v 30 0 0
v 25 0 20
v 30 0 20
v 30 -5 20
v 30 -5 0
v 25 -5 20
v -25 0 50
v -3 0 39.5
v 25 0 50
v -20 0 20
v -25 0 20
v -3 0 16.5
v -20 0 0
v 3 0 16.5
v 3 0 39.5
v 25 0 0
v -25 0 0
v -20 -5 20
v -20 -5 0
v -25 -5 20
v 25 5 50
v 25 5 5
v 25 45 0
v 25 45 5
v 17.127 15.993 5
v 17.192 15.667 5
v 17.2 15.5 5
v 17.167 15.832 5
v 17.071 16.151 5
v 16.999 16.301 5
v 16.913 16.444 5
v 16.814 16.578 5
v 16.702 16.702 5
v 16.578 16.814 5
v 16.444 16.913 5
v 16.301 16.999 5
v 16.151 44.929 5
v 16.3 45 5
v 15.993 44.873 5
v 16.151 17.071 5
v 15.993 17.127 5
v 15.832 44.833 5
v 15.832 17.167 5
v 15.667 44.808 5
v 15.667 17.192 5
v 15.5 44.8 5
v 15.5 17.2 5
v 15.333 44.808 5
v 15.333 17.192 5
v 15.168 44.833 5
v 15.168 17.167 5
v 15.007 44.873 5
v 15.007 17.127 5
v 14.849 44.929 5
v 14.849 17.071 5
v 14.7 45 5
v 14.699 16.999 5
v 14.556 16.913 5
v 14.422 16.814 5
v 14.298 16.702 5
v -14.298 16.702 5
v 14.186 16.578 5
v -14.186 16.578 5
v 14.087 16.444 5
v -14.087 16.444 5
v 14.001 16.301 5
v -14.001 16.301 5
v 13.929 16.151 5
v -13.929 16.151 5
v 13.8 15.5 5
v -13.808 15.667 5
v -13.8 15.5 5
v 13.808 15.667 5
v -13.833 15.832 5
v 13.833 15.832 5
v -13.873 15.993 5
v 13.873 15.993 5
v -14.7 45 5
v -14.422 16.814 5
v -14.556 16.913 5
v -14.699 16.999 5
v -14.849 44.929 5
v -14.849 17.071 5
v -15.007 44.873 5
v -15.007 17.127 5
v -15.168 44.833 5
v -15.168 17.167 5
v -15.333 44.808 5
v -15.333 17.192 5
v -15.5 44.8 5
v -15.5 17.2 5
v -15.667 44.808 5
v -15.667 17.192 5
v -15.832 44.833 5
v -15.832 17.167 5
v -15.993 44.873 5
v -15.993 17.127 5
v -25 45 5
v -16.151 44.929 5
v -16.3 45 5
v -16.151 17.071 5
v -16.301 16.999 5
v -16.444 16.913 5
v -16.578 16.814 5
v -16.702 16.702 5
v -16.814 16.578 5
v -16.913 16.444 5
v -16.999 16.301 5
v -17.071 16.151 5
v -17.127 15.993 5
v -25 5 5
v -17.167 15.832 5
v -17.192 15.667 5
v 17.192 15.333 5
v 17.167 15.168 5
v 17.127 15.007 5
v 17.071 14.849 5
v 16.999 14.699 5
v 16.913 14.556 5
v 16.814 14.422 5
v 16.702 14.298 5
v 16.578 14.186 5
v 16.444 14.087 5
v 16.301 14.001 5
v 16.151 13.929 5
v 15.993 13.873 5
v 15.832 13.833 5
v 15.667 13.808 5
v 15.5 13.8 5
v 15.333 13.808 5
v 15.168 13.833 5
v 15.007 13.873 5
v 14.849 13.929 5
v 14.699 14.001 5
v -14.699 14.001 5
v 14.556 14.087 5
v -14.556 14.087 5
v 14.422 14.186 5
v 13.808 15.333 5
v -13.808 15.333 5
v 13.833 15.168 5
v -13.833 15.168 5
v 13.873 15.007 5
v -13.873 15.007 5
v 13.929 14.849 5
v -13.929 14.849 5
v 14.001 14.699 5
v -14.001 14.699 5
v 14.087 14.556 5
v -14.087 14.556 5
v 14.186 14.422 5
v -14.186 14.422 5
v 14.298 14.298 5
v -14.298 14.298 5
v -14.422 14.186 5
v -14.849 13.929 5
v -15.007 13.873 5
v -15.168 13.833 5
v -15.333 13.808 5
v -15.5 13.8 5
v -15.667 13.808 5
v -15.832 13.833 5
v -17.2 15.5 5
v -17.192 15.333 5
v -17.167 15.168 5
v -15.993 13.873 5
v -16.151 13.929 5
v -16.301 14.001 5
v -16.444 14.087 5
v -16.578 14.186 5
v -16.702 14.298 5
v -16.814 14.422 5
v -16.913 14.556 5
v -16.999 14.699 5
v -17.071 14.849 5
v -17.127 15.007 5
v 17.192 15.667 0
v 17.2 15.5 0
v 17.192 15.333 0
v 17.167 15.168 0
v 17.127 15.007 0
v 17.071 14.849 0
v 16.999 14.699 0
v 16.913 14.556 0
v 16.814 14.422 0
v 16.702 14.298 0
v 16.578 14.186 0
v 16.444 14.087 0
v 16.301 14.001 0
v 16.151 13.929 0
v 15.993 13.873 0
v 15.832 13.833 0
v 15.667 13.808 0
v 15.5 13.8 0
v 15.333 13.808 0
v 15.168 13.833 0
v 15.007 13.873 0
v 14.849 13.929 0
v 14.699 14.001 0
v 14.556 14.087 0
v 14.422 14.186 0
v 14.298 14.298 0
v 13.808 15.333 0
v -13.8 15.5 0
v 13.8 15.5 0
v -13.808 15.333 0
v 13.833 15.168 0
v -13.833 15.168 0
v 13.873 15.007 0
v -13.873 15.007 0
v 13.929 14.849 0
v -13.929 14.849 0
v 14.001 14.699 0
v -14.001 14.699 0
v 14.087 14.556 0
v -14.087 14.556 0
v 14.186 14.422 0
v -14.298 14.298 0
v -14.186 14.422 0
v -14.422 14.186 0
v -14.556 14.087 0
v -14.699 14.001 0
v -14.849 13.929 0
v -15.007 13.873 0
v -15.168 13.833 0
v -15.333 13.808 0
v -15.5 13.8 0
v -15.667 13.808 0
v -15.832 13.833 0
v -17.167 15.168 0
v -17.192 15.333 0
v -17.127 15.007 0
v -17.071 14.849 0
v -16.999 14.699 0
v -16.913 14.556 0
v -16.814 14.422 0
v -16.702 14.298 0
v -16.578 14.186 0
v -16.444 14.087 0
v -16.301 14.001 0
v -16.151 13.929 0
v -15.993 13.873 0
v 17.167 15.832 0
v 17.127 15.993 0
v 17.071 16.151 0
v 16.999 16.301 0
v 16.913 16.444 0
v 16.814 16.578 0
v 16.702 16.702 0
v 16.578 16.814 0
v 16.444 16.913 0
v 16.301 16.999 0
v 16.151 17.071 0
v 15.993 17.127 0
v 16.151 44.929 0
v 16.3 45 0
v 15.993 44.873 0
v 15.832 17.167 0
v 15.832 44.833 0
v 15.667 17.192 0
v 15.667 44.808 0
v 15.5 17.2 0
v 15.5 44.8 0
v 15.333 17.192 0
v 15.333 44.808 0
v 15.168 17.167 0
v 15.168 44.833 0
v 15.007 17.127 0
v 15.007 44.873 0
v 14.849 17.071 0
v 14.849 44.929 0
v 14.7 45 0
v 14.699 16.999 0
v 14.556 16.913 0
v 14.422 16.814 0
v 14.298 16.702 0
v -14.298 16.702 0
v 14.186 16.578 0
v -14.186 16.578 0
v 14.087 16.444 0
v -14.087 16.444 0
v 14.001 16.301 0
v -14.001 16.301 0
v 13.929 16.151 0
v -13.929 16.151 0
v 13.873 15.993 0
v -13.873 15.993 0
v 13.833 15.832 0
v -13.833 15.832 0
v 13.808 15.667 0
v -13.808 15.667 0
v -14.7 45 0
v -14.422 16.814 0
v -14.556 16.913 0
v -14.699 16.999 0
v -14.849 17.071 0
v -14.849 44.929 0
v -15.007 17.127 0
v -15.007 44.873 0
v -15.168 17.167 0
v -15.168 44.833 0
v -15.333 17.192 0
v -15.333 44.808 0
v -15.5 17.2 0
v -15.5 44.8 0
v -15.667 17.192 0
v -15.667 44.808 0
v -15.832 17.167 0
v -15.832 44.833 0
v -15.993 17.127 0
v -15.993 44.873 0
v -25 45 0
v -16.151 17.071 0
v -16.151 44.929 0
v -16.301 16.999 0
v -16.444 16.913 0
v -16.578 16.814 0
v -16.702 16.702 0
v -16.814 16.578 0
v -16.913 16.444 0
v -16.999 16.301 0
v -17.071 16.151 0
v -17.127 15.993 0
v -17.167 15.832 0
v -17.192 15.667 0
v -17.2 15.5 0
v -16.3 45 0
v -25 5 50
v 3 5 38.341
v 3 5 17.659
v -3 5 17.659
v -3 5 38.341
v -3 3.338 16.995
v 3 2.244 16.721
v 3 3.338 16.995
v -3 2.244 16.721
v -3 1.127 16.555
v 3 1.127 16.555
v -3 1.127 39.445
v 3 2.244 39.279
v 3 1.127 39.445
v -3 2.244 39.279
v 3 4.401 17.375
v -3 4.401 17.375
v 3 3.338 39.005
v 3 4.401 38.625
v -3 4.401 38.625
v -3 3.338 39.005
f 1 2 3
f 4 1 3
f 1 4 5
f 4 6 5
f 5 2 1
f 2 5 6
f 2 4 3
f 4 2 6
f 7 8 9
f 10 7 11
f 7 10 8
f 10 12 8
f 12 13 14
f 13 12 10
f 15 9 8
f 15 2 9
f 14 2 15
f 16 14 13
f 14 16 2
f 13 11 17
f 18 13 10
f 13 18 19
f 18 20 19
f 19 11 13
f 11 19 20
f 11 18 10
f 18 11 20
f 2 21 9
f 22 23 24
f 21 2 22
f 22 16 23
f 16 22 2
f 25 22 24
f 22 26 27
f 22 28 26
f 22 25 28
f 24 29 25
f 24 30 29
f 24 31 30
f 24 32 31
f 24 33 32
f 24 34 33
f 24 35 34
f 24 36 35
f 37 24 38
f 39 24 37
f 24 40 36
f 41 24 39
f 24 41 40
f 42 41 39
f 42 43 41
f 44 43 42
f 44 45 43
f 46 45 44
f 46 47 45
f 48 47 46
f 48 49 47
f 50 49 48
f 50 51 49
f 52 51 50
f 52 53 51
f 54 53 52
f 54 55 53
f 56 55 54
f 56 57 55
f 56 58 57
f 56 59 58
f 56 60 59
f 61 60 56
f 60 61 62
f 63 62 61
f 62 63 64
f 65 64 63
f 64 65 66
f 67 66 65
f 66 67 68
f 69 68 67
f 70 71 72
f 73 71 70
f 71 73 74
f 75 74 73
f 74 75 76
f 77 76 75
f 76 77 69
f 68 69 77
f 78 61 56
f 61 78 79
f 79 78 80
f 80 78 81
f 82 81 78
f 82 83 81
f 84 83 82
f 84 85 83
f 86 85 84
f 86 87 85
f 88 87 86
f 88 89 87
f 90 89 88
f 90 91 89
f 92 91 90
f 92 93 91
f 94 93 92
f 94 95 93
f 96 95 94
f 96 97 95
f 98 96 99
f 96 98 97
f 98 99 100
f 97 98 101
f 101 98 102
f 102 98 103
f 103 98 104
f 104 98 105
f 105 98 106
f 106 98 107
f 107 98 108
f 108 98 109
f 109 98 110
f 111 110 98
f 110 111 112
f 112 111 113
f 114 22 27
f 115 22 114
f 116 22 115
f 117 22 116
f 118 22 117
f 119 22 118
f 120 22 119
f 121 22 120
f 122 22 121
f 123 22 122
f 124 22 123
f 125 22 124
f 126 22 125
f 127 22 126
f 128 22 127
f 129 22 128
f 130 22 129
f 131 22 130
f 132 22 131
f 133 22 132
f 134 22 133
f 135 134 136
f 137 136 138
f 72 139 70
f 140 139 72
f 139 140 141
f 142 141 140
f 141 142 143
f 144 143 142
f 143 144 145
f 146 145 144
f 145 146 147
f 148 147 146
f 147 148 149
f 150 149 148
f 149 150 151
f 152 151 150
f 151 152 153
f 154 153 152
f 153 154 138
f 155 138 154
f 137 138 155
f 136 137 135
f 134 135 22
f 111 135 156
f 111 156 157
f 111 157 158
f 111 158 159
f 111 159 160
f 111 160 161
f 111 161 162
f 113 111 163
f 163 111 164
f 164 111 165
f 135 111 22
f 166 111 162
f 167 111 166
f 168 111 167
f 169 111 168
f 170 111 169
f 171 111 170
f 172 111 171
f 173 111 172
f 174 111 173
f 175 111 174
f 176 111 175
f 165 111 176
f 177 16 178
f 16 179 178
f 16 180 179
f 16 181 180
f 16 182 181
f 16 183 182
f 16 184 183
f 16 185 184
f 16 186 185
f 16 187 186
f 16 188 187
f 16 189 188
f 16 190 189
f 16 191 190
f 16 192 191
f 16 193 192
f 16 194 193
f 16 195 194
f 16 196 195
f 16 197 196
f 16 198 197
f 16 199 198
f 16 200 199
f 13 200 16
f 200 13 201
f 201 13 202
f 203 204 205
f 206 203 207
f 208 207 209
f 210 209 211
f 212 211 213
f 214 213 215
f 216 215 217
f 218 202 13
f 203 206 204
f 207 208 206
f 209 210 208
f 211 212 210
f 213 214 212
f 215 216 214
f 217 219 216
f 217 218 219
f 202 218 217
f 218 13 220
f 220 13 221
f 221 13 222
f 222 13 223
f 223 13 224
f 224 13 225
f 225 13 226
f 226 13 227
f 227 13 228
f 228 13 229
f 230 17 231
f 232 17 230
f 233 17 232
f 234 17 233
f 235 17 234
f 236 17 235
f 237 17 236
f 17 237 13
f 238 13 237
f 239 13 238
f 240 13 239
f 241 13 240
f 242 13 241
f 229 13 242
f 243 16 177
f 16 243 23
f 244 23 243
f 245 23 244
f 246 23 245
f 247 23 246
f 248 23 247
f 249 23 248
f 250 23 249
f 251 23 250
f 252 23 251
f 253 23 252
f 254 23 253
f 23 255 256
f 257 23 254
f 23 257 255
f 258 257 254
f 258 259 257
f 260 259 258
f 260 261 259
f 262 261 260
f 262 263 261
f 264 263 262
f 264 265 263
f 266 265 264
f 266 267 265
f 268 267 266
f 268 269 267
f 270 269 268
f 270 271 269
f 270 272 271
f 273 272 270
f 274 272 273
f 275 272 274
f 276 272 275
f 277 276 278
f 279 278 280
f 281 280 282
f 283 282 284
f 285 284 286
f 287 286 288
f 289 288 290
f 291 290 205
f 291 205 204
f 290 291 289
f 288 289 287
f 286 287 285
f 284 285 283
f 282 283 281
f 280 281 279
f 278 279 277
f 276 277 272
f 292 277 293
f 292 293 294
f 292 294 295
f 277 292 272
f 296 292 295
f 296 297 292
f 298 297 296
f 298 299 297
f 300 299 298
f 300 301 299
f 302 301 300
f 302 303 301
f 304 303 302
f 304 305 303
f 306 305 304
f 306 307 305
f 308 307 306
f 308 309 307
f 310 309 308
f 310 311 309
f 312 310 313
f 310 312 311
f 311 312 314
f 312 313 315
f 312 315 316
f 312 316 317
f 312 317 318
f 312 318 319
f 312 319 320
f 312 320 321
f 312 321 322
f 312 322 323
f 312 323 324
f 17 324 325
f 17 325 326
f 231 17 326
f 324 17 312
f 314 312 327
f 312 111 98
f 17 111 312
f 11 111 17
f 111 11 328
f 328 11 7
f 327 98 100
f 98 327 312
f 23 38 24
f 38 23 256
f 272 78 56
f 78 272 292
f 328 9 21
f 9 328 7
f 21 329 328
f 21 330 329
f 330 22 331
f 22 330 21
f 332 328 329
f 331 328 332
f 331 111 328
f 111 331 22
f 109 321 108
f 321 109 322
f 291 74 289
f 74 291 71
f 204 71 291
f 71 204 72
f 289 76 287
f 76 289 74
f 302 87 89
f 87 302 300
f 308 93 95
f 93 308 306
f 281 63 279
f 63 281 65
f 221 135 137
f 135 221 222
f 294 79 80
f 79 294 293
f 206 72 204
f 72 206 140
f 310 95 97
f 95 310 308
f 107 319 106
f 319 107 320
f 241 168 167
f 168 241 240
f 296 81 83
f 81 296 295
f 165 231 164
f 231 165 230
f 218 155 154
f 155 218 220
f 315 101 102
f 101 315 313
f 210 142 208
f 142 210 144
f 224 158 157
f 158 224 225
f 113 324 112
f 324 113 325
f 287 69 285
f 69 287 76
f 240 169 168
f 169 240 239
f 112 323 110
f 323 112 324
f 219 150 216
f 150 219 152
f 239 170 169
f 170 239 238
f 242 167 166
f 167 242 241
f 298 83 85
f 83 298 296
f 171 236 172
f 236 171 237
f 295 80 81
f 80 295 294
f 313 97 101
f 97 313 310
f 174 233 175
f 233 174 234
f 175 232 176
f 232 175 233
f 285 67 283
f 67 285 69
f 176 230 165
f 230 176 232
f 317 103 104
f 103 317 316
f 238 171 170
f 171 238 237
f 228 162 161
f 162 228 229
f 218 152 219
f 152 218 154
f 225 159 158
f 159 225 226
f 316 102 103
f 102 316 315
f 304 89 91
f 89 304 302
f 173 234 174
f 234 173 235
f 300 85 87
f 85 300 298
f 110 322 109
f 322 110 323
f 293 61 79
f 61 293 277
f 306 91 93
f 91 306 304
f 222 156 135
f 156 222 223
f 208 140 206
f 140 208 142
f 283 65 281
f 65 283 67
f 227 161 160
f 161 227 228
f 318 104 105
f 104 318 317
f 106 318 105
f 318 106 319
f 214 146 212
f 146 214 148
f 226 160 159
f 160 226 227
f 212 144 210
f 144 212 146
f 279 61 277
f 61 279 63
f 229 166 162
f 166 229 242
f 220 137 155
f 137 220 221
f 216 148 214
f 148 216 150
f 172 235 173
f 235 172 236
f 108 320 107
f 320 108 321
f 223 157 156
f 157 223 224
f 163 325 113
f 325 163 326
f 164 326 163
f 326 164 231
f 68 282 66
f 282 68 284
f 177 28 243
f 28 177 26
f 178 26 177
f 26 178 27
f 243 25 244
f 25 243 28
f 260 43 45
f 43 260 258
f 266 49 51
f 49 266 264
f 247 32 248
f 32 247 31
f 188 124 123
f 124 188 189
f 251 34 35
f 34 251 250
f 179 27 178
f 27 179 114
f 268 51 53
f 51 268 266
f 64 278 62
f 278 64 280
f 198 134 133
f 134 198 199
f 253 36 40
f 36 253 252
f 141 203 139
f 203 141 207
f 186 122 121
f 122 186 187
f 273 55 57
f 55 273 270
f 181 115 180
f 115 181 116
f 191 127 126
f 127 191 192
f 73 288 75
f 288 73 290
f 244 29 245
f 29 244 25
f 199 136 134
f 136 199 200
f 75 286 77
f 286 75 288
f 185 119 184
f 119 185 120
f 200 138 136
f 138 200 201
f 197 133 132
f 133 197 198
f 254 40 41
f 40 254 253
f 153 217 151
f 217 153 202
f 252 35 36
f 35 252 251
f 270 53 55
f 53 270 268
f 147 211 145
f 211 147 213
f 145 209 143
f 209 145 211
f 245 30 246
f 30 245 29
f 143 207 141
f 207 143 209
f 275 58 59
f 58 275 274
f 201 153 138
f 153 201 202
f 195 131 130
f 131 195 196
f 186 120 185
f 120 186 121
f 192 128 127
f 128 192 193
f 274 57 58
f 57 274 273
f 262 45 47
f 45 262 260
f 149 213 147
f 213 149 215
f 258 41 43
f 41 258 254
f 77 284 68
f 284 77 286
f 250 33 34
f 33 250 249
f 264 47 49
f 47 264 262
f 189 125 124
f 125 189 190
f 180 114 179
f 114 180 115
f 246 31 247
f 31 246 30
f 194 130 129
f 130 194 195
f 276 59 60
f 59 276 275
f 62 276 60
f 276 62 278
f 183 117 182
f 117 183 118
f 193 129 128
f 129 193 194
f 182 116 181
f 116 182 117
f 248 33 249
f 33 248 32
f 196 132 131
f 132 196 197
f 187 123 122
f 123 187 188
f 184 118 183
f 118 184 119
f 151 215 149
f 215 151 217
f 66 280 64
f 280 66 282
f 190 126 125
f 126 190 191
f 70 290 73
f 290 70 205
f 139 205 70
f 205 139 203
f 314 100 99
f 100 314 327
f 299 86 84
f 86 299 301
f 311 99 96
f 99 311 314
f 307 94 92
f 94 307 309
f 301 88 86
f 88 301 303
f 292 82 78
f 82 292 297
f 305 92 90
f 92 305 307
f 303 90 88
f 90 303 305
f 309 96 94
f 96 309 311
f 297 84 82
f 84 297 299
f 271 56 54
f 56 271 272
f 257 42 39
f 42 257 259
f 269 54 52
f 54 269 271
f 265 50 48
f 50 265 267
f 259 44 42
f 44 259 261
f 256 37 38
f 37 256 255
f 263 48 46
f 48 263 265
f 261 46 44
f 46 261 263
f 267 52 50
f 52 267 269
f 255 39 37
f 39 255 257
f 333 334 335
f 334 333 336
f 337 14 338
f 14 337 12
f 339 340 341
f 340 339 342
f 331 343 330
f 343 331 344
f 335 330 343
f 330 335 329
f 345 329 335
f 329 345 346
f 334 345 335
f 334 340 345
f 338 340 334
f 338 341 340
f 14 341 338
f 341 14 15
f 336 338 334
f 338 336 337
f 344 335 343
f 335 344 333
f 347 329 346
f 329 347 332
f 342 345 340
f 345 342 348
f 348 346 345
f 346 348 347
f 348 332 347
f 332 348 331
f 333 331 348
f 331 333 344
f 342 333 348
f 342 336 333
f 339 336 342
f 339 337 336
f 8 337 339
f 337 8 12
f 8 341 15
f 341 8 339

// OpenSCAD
// L-shaped mounting bracket for NEMA 17 stepper motor
// Print orientation: base plate on bed (z = 0), motor plate builds upward (+Z)

$fn = 64;

// ---- Base plate ----
base_x0 = -25;      // base plate x start
base_x1 = 25;       // base plate x end
base_y0 = 0;        // base plate y start
base_y1 = 45;       // base plate y end
base_z0 = 0;        // base plate z start
base_z1 = 5;        // base plate z end (thickness)

// ---- Motor plate ----
motor_x0 = -25;     // motor plate x start
motor_x1 = 25;      // motor plate x end
motor_y0 = 0;       // motor plate y start
motor_y1 = 5;       // motor plate y end (thickness)
motor_z0 = 0;       // motor plate z start (bottom of plate)
motor_z1 = 50;      // motor plate z end (top of plate)

// ---- Boss hole ----
boss_d = 23;        // boss hole diameter
boss_x = 0;         // boss hole x centre
boss_z = 28;        // boss hole z centre

// ---- Screw holes ----
screw_d = 3.4;      // M3 screw hole diameter
screw_pitch = 31;   // square pattern side length
screw_count = 4;    // number of screw holes

// ---- Gussets ----
gusset_t = 5;       // gusset thickness (along X)
gusset_leg = 20;    // right triangle leg lengths (along Y and Z)
gusset_x0 = -25;    // left gusset x start
gusset_x1 = -20;    // left gusset x end
gusset_y1 = 5;      // gusset Y leg end
gusset_z1 = 5;      // gusset Z leg end

// ---- Misc ----
eps = 0.5;          // cutter overshoot past faces

difference() {
    union() {
        // Base plate
        translate([base_x0, base_y0, base_z0])
            cube([base_x1 - base_x0, base_y1 - base_y0, base_z1 - base_z0]);

        // Vertical motor plate
        translate([motor_x0, motor_y0, motor_z0])
            cube([motor_x1 - motor_x0, motor_y1 - motor_y0, motor_z1 - motor_z0]);

        // Triangular gussets
        for (sx = [-1, 1]) {
            translate([sx * gusset_x0, 0, 0])
                rotate([90, 0, 0])
                    linear_extrude(height = gusset_t)
                        polygon(points = [
                            [gusset_y1, 0],
                            [gusset_y1, gusset_leg],
                            [0, gusset_leg]
                        ]);
        }
    }

    // Boss hole
    translate([boss_x, 0, boss_z])
        rotate([0, 90, 0])
            cylinder(d = boss_d, h = motor_y1 - motor_y0 + 2 * eps, center = true);

    // Screw holes
    for (i = [0 : screw_count - 1]) {
        for (j = [0 : screw_count - 1]) {
            x = (j - (screw_count - 1) / 2) * screw_pitch;
            y = (i - (screw_count - 1) / 2) * screw_pitch;
            translate([x, y, -eps])
                cylinder(d = screw_d, h = motor_z1 - motor_z0 + 2 * eps);
        }
    }
}
